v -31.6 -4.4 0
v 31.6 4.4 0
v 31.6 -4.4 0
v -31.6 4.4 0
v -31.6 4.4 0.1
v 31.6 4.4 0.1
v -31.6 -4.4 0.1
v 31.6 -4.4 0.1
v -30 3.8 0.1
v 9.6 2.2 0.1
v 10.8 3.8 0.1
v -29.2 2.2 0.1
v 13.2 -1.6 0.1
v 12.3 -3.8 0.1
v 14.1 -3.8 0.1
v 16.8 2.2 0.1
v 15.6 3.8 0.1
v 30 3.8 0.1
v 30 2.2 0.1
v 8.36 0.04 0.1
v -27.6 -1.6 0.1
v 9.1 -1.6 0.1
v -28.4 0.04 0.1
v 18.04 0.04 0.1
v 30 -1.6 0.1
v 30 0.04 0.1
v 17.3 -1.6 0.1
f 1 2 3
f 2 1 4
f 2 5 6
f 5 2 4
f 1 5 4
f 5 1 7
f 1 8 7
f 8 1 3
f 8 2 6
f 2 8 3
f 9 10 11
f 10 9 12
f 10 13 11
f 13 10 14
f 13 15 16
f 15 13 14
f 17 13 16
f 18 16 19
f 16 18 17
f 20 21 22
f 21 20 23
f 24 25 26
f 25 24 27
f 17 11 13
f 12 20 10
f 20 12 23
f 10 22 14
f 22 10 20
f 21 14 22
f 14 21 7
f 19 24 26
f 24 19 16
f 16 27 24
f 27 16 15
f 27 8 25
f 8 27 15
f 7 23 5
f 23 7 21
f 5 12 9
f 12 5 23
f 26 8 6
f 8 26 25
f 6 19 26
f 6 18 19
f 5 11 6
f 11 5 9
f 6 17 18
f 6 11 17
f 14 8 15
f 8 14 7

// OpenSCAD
// file: ../p/4-4edge.scad
use <../lib.scad>
$fa=1; $fs=0.2;
function ldraw_lib__4_4edge(realsolid=false) = [
// 0 Circle 1.0
// 0 Name: 4-4edge.dat
// 0 Author: James Jessiman
// 0 !LDRAW_ORG Primitive UPDATE 2017-01
// 0 !LICENSE Licensed under CC BY 2.0 and CC BY 4.0 : see CAreadme.txt
// 
// 0 BFC CERTIFY CCW
  [0,"BFC","CERTIFY"],
  [0,"BFC","CCW"],
// 
// 0 !HISTORY 1998-12-15 [PTadmin] Official Update 1998-10
// 0 !HISTORY 2005-12-28 [PTadmin] Official Update 2005-01
// 0 !HISTORY 2007-06-24 [PTadmin] Header formatted for Contributor Agreement
// 0 !HISTORY 2008-07-01 [PTadmin] Official Update 2008-01
// 0 !HISTORY 2017-01-15 [Steffen] BFCed
// 0 !HISTORY 2017-12-30 [PTadmin] Official Update 2017-01
// 
// 
// 2 24 1 0 0 0.9239 0 0.3827
  [2,24,1,0,0,0.9239,0,0.3827],
// 2 24 0.9239 0 0.3827 0.7071 0 0.7071
  [2,24,0.9239,0,0.3827,0.7071,0,0.7071],
// 2 24 0.7071 0 0.7071 0.3827 0 0.9239
  [2,24,0.7071,0,0.7071,0.3827,0,0.9239],
// 2 24 0.3827 0 0.9239 0 0 1
  [2,24,0.3827,0,0.9239,0,0,1],
// 2 24 0 0 1 -0.3827 0 0.9239
  [2,24,0,0,1,-0.3827,0,0.9239],
// 2 24 -0.3827 0 0.9239 -0.7071 0 0.7071
  [2,24,-0.3827,0,0.9239,-0.7071,0,0.7071],
// 2 24 -0.7071 0 0.7071 -0.9239 0 0.3827
  [2,24,-0.7071,0,0.7071,-0.9239,0,0.3827],
// 2 24 -0.9239 0 0.3827 -1 0 -0
  [2,24,-0.9239,0,0.3827,-1,0,-0],
// 2 24 -1 0 -0 -0.9239 0 -0.3827
  [2,24,-1,0,-0,-0.9239,0,-0.3827],
// 2 24 -0.9239 0 -0.3827 -0.7071 0 -0.7071
  [2,24,-0.9239,0,-0.3827,-0.7071,0,-0.7071],
// 2 24 -0.7071 0 -0.7071 -0.3827 0 -0.9239
  [2,24,-0.7071,0,-0.7071,-0.3827,0,-0.9239],
// 2 24 -0.3827 0 -0.9239 0 0 -1
  [2,24,-0.3827,0,-0.9239,0,0,-1],
// 2 24 0 0 -1 0.3827 0 -0.9239
  [2,24,0,0,-1,0.3827,0,-0.9239],
// 2 24 0.3827 0 -0.9239 0.7071 0 -0.7071
  [2,24,0.3827,0,-0.9239,0.7071,0,-0.7071],
// 2 24 0.7071 0 -0.7071 0.9239 0 -0.3827
  [2,24,0.7071,0,-0.7071,0.9239,0,-0.3827],
// 2 24 0.9239 0 -0.3827 1 0 0
  [2,24,0.9239,0,-0.3827,1,0,0],
];
module ldraw_lib__4_4edge(step=0, col=false, unit=2/5, alt=false, line=0.2, solid=!$preview)
    makepoly(ldraw_lib__4_4edge(solid), step=step, col=col, unit=unit, alt=alt, line=line, solid=solid);
ldraw_lib__4_4edge(line=0.2);
// file: ../p/4-4disc.scad
use <../lib.scad>
$fa=1; $fs=0.2;
function ldraw_lib__4_4disc(realsolid=false) = [
// 0 Disc 1.0
// 0 Name: 4-4disc.dat
// 0 Author: James Jessiman
// 0 !LDRAW_ORG Primitive UPDATE 2002-02
// 0 !LICENSE Licensed under CC BY 2.0 and CC BY 4.0 : see CAreadme.txt
// 
// 0 BFC CERTIFY CCW
  [0,"BFC","CERTIFY"],
  [0,"BFC","CCW"],
// 
// 0 !HISTORY 1998-12-15 [PTadmin] Official Update 1998-10
// 0 !HISTORY 2002-03-23 [sbliss] Added BFC statement
// 0 !HISTORY 2002-04-25 [PTadmin] Official Update 2002-02
// 0 !HISTORY 2007-06-24 [PTadmin] Header formatted for Contributor Agreement
// 0 !HISTORY 2008-07-01 [PTadmin] Official Update 2008-01
// 
// 
// 3 16 0 0 0 1 0 0 0.9239 0 0.3827
  [3,16,0,0,0,1,0,0,0.9239,0,0.3827],
// 3 16 0 0 0 0.9239 0 0.3827 0.7071 0 0.7071
  [3,16,0,0,0,0.9239,0,0.3827,0.7071,0,0.7071],
// 3 16 0 0 0 0.7071 0 0.7071 0.3827 0 0.9239
  [3,16,0,0,0,0.7071,0,0.7071,0.3827,0,0.9239],
// 3 16 0 0 0 0.3827 0 0.9239 0 0 1
  [3,16,0,0,0,0.3827,0,0.9239,0,0,1],
// 3 16 0 0 0 0 0 1 -0.3827 0 0.9239
  [3,16,0,0,0,0,0,1,-0.3827,0,0.9239],
// 3 16 0 0 0 -0.3827 0 0.9239 -0.7071 0 0.7071
  [3,16,0,0,0,-0.3827,0,0.9239,-0.7071,0,0.7071],
// 3 16 0 0 0 -0.7071 0 0.7071 -0.9239 0 0.3827
  [3,16,0,0,0,-0.7071,0,0.7071,-0.9239,0,0.3827],
// 3 16 0 0 0 -0.9239 0 0.3827 -1 0 -0
  [3,16,0,0,0,-0.9239,0,0.3827,-1,0,-0],
// 3 16 0 0 0 -1 0 -0 -0.9239 0 -0.3827
  [3,16,0,0,0,-1,0,-0,-0.9239,0,-0.3827],
// 3 16 0 0 0 -0.9239 0 -0.3827 -0.7071 0 -0.7071
  [3,16,0,0,0,-0.9239,0,-0.3827,-0.7071,0,-0.7071],
// 3 16 0 0 0 -0.7071 0 -0.7071 -0.3827 0 -0.9239
  [3,16,0,0,0,-0.7071,0,-0.7071,-0.3827,0,-0.9239],
// 3 16 0 0 0 -0.3827 0 -0.9239 0 0 -1
  [3,16,0,0,0,-0.3827,0,-0.9239,0,0,-1],
// 3 16 0 0 0 0 0 -1 0.3827 0 -0.9239
  [3,16,0,0,0,0,0,-1,0.3827,0,-0.9239],
// 3 16 0 0 0 0.3827 0 -0.9239 0.7071 0 -0.7071
  [3,16,0,0,0,0.3827,0,-0.9239,0.7071,0,-0.7071],
// 3 16 0 0 0 0.7071 0 -0.7071 0.9239 0 -0.3827
  [3,16,0,0,0,0.7071,0,-0.7071,0.9239,0,-0.3827],
// 3 16 0 0 0 0.9239 0 -0.3827 1 0 0
  [3,16,0,0,0,0.9239,0,-0.3827,1,0,0],
// 0
];
module ldraw_lib__4_4disc(step=0, col=false, unit=2/5, alt=false, line=0.2, solid=!$preview)
    makepoly(ldraw_lib__4_4disc(solid), step=step, col=col, unit=unit, alt=alt, line=line, solid=solid);
ldraw_lib__4_4disc(line=0.2);
// file: ../p/4-4cyli.scad
use <../lib.scad>
$fa=1; $fs=0.2;
function ldraw_lib__4_4cyli(realsolid=false) = [
// 0 Cylinder 1.0
// 0 Name: 4-4cyli.dat
// 0 Author: James Jessiman
// 0 !LDRAW_ORG Primitive UPDATE 2005-01
// 0 !LICENSE Licensed under CC BY 2.0 and CC BY 4.0 : see CAreadme.txt
// 
// 0 BFC CERTIFY CCW
  [0,"BFC","CERTIFY"],
  [0,"BFC","CCW"],
// 
// 0 !HISTORY 1998-12-15 [PTadmin] Official Update 1998-10
// 0 !HISTORY 2002-03-23 [sbliss] Added BFC statement; merged headers from files in distributions LDraw 0.27 and Complete.
// 0 !HISTORY 2002-04-25 [PTadmin] Official Update 2002-02
// 0 !HISTORY 2004-12-14 [guyvivan] BFC CCW
// 0 !HISTORY 2005-12-28 [PTadmin] Official Update 2005-01
// 0 !HISTORY 2007-06-24 [PTadmin] Header formatted for Contributor Agreement
// 0 !HISTORY 2008-07-01 [PTadmin] Official Update 2008-01
// 
// 
// 4 16 1 1 0 0.9239 1 0.3827 0.9239 0 0.3827 1 0 0
  [4,16,1,1,0,0.9239,1,0.3827,0.9239,0,0.3827,1,0,0],
// 5 24 1 0 0 1 1 0 0.9239 0 0.3827 0.9239 0 -0.3827
  [5,24,1,0,0,1,1,0,0.9239,0,0.3827,0.9239,0,-0.3827],
// 4 16 0.9239 1 0.3827 0.7071 1 0.7071 0.7071 0 0.7071 0.9239 0 0.3827
  [4,16,0.9239,1,0.3827,0.7071,1,0.7071,0.7071,0,0.7071,0.9239,0,0.3827],
// 5 24 0.9239 0 0.3827 0.9239 1 0.3827 0.7071 0 0.7071 1 0 0
  [5,24,0.9239,0,0.3827,0.9239,1,0.3827,0.7071,0,0.7071,1,0,0],
// 4 16 0.7071 1 0.7071 0.3827 1 0.9239 0.3827 0 0.9239 0.7071 0 0.7071
  [4,16,0.7071,1,0.7071,0.3827,1,0.9239,0.3827,0,0.9239,0.7071,0,0.7071],
// 5 24 0.7071 0 0.7071 0.7071 1 0.7071 0.3827 0 0.9239 0.9239 0 0.3827
  [5,24,0.7071,0,0.7071,0.7071,1,0.7071,0.3827,0,0.9239,0.9239,0,0.3827],
// 4 16 0.3827 1 0.9239 0 1 1 0 0 1 0.3827 0 0.9239
  [4,16,0.3827,1,0.9239,0,1,1,0,0,1,0.3827,0,0.9239],
// 5 24 0.3827 0 0.9239 0.3827 1 0.9239 0 0 1 0.7071 0 0.7071
  [5,24,0.3827,0,0.9239,0.3827,1,0.9239,0,0,1,0.7071,0,0.7071],
// 4 16 0 1 1 -0.3827 1 0.9239 -0.3827 0 0.9239 0 0 1
  [4,16,0,1,1,-0.3827,1,0.9239,-0.3827,0,0.9239,0,0,1],
// 5 24 0 0 1 0 1 1 -0.3827 0 0.9239 0.3827 0 0.9239
  [5,24,0,0,1,0,1,1,-0.3827,0,0.9239,0.3827,0,0.9239],
// 4 16 -0.3827 1 0.9239 -0.7071 1 0.7071 -0.7071 0 0.7071 -0.3827 0 0.9239
  [4,16,-0.3827,1,0.9239,-0.7071,1,0.7071,-0.7071,0,0.7071,-0.3827,0,0.9239],
// 5 24 -0.3827 0 0.9239 -0.3827 1 0.9239 -0.7071 0 0.7071 0 0 1
  [5,24,-0.3827,0,0.9239,-0.3827,1,0.9239,-0.7071,0,0.7071,0,0,1],
// 4 16 -0.7071 1 0.7071 -0.9239 1 0.3827 -0.9239 0 0.3827 -0.7071 0 0.7071
  [4,16,-0.7071,1,0.7071,-0.9239,1,0.3827,-0.9239,0,0.3827,-0.7071,0,0.7071],
// 5 24 -0.7071 0 0.7071 -0.7071 1 0.7071 -0.9239 0 0.3827 -0.3827 0 0.9239
  [5,24,-0.7071,0,0.7071,-0.7071,1,0.7071,-0.9239,0,0.3827,-0.3827,0,0.9239],
// 4 16 -0.9239 1 0.3827 -1 1 0 -1 0 0 -0.9239 0 0.3827
  [4,16,-0.9239,1,0.3827,-1,1,0,-1,0,0,-0.9239,0,0.3827],
// 5 24 -0.9239 0 0.3827 -0.9239 1 0.3827 -1 0 0 -0.7071 0 0.7071
  [5,24,-0.9239,0,0.3827,-0.9239,1,0.3827,-1,0,0,-0.7071,0,0.7071],
// 4 16 -1 1 0 -0.9239 1 -0.3827 -0.9239 0 -0.3827 -1 0 0
  [4,16,-1,1,0,-0.9239,1,-0.3827,-0.9239,0,-0.3827,-1,0,0],
// 5 24 -1 0 0 -1 1 0 -0.9239 0 -0.3827 -0.9239 0 0.3827
  [5,24,-1,0,0,-1,1,0,-0.9239,0,-0.3827,-0.9239,0,0.3827],
// 4 16 -0.9239 1 -0.3827 -0.7071 1 -0.7071 -0.7071 0 -0.7071 -0.9239 0 -0.3827
  [4,16,-0.9239,1,-0.3827,-0.7071,1,-0.7071,-0.7071,0,-0.7071,-0.9239,0,-0.3827],
// 5 24 -0.9239 0 -0.3827 -0.9239 1 -0.3827 -0.7071 0 -0.7071 -1 0 0
  [5,24,-0.9239,0,-0.3827,-0.9239,1,-0.3827,-0.7071,0,-0.7071,-1,0,0],
// 4 16 -0.7071 1 -0.7071 -0.3827 1 -0.9239 -0.3827 0 -0.9239 -0.7071 0 -0.7071
  [4,16,-0.7071,1,-0.7071,-0.3827,1,-0.9239,-0.3827,0,-0.9239,-0.7071,0,-0.7071],
// 5 24 -0.7071 0 -0.7071 -0.7071 1 -0.7071 -0.3827 0 -0.9239 -0.9239 0 -0.3827
  [5,24,-0.7071,0,-0.7071,-0.7071,1,-0.7071,-0.3827,0,-0.9239,-0.9239,0,-0.3827],
// 4 16 -0.3827 1 -0.9239 0 1 -1 0 0 -1 -0.3827 0 -0.9239
  [4,16,-0.3827,1,-0.9239,0,1,-1,0,0,-1,-0.3827,0,-0.9239],
// 5 24 -0.3827 0 -0.9239 -0.3827 1 -0.9239 0 0 -1 -0.7071 0 -0.7071
  [5,24,-0.3827,0,-0.9239,-0.3827,1,-0.9239,0,0,-1,-0.7071,0,-0.7071],
// 4 16 0 1 -1 0.3827 1 -0.9239 0.3827 0 -0.9239 0 0 -1
  [4,16,0,1,-1,0.3827,1,-0.9239,0.3827,0,-0.9239,0,0,-1],
// 5 24 0 0 -1 0 1 -1 0.3827 0 -0.9239 -0.3827 0 -0.9239
  [5,24,0,0,-1,0,1,-1,0.3827,0,-0.9239,-0.3827,0,-0.9239],
// 4 16 0.3827 1 -0.9239 0.7071 1 -0.7071 0.7071 0 -0.7071 0.3827 0 -0.9239
  [4,16,0.3827,1,-0.9239,0.7071,1,-0.7071,0.7071,0,-0.7071,0.3827,0,-0.9239],
// 5 24 0.3827 0 -0.9239 0.3827 1 -0.9239 0.7071 0 -0.7071 0 0 -1
  [5,24,0.3827,0,-0.9239,0.3827,1,-0.9239,0.7071,0,-0.7071,0,0,-1],
// 4 16 0.7071 1 -0.7071 0.9239 1 -0.3827 0.9239 0 -0.3827 0.7071 0 -0.7071
  [4,16,0.7071,1,-0.7071,0.9239,1,-0.3827,0.9239,0,-0.3827,0.7071,0,-0.7071],
// 5 24 0.7071 0 -0.7071 0.7071 1 -0.7071 0.9239 0 -0.3827 0.3827 0 -0.9239
  [5,24,0.7071,0,-0.7071,0.7071,1,-0.7071,0.9239,0,-0.3827,0.3827,0,-0.9239],
// 4 16 0.9239 1 -0.3827 1 1 0 1 0 0 0.9239 0 -0.3827
  [4,16,0.9239,1,-0.3827,1,1,0,1,0,0,0.9239,0,-0.3827],
// 5 24 0.9239 0 -0.3827 0.9239 1 -0.3827 1 0 0 0.7071 0 -0.7071
  [5,24,0.9239,0,-0.3827,0.9239,1,-0.3827,1,0,0,0.7071,0,-0.7071],
// 0
];
module ldraw_lib__4_4cyli(step=0, col=false, unit=2/5, alt=false, line=0.2, solid=!$preview)
    makepoly(ldraw_lib__4_4cyli(solid), step=step, col=col, unit=unit, alt=alt, line=line, solid=solid);
ldraw_lib__4_4cyli(line=0.2);
// file: ../p/stud3.scad
use <../lib.scad>
use <4-4cyli.scad>
use <4-4disc.scad>
use <4-4edge.scad>
$fa=1; $fs=0.2;
function ldraw_lib__stud3(realsolid=false) = realsolid ? 
    [openscad(translate([0,0,-eps()], o=cylinder(4+eps(), r=4)),2)] : [
// 0 Stud Tube Solid
// 0 Name: stud3.dat
// 0 Author: James Jessiman
// 0 !LDRAW_ORG Primitive UPDATE 2012-01
// 0 !LICENSE Licensed under CC BY 2.0 and CC BY 4.0 : see CAreadme.txt
// 
// 0 BFC CERTIFY CCW
  [0,"BFC","CERTIFY"],
  [0,"BFC","CCW"],
// 
// 0 !HISTORY 2002-04-04 [sbliss] Modified for BFC compliance
// 0 !HISTORY 2002-04-25 [PTadmin] Official Update 2002-02
// 0 !HISTORY 2007-06-24 [PTadmin] Header formatted for Contributor Agreement
// 0 !HISTORY 2008-07-01 [PTadmin] Official Update 2008-01
// 0 !HISTORY 2012-02-16 [Philo] Changed to CCW
// 0 !HISTORY 2012-03-30 [PTadmin] Official Update 2012-01
// 
// 
// 1 16 0 -4 0 4 0 0 0 1 0 0 0 4 4-4edge.dat
  [1,16,0,-4,0,4,0,0,0,1,0,0,0,4, ldraw_lib__4_4edge(realsolid)],
// 1 16 0 0 0 4 0 0 0 1 0 0 0 4 4-4edge.dat
  [1,16,0,0,0,4,0,0,0,1,0,0,0,4, ldraw_lib__4_4edge(realsolid)],
// 1 16 0 -4 0 4 0 0 0 1 0 0 0 4 4-4disc.dat
  [1,16,0,-4,0,4,0,0,0,1,0,0,0,4, ldraw_lib__4_4disc(realsolid)],
// 1 16 0 -4 0 4 0 0 0 4 0 0 0 4 4-4cyli.dat
  [1,16,0,-4,0,4,0,0,0,4,0,0,0,4, ldraw_lib__4_4cyli(realsolid)],
];
module ldraw_lib__stud3(step=0, col=false, unit=2/5, alt=false, line=0.2, solid=!$preview)
    makepoly(ldraw_lib__stud3(solid), step=step, col=col, unit=unit, alt=alt, line=line, solid=solid);
ldraw_lib__stud3(line=0.2);
// file: ../p/stud.scad
use <../lib.scad>
use <4-4cyli.scad>
use <4-4disc.scad>
use <4-4edge.scad>
$fa=1; $fs=0.2;
function ldraw_lib__stud(realsolid=false) = realsolid ? 
    [openscad(translate([0,0,-eps()], o=cylinder(4+eps(), r=6)),2)] : [
// 0 Stud
// 0 Name: stud.dat
// 0 Author: James Jessiman
// 0 !LDRAW_ORG Primitive UPDATE 2012-01
// 0 !LICENSE Licensed under CC BY 2.0 and CC BY 4.0 : see CAreadme.txt
// 
// 0 BFC CERTIFY CCW
  [0,"BFC","CERTIFY"],
  [0,"BFC","CCW"],
// 
// 0 !HISTORY 2002-04-04 [sbliss] Modified for BFC compliance
// 0 !HISTORY 2002-04-25 [PTadmin] Official Update 2002-02
// 0 !HISTORY 2007-06-24 [PTadmin] Header formatted for Contributor Agreement
// 0 !HISTORY 2008-07-01 [PTadmin] Official Update 2008-01
// 0 !HISTORY 2012-02-16 [Philo] Changed to CCW
// 0 !HISTORY 2012-03-30 [PTadmin] Official Update 2012-01
// 
// 
// 1 16 0 0 0 6 0 0 0 1 0 0 0 6 4-4edge.dat
  [1,16,0,0,0,6,0,0,0,1,0,0,0,6, ldraw_lib__4_4edge(realsolid)],
// 1 16 0 -4 0 6 0 0 0 1 0 0 0 6 4-4edge.dat
  [1,16,0,-4,0,6,0,0,0,1,0,0,0,6, ldraw_lib__4_4edge(realsolid)],
// 1 16 0 0 0 6 0 0 0 -4 0 0 0 6 4-4cyli.dat
  [1,16,0,0,0,6,0,0,0,-4,0,0,0,6, ldraw_lib__4_4cyli(realsolid)],
// 1 16 0 -4 0 6 0 0 0 1 0 0 0 6 4-4disc.dat
  [1,16,0,-4,0,6,0,0,0,1,0,0,0,6, ldraw_lib__4_4disc(realsolid)],
];
module ldraw_lib__stud(step=0, col=false, unit=2/5, alt=false, line=0.2, solid=!$preview)
    makepoly(ldraw_lib__stud(solid), step=step, col=col, unit=unit, alt=alt, line=line, solid=solid);
ldraw_lib__stud(line=0.2);
// file: ../p/box5.scad
use <../lib.scad>
$fa=1; $fs=0.2;
function ldraw_lib__box5(realsolid=false) = [
// 0 Box with 5 Faces and All Edges
// 0 Name: box5.dat
// 0 Author: James Jessiman
// 0 !LDRAW_ORG Primitive UPDATE 2012-01
// 0 !LICENSE Licensed under CC BY 2.0 and CC BY 4.0 : see CAreadme.txt
// 
// 0 BFC CERTIFY CCW
  [0,"BFC","CERTIFY"],
  [0,"BFC","CCW"],
// 
// 0 !HISTORY 2002-04-03 [sbliss] Modified for BFC compliance
// 0 !HISTORY 2002-04-25 [PTadmin] Official Update 2002-02
// 0 !HISTORY 2007-06-24 [PTadmin] Header formatted for Contributor Agreement
// 0 !HISTORY 2008-07-01 [PTadmin] Official Update 2008-01
// 0 !HISTORY 2012-02-16 [Philo] Changed to CCW
// 0 !HISTORY 2012-03-30 [PTadmin] Official Update 2012-01
// 
// 
// 2 24 1 1 1 -1 1 1
  [2,24,1,1,1,-1,1,1],
// 2 24 -1 1 1 -1 1 -1
  [2,24,-1,1,1,-1,1,-1],
// 2 24 -1 1 -1 1 1 -1
  [2,24,-1,1,-1,1,1,-1],
// 2 24 1 1 -1 1 1 1
  [2,24,1,1,-1,1,1,1],
// 2 24 1 0 1 -1 0 1
  [2,24,1,0,1,-1,0,1],
// 2 24 -1 0 1 -1 0 -1
  [2,24,-1,0,1,-1,0,-1],
// 2 24 -1 0 -1 1 0 -1
  [2,24,-1,0,-1,1,0,-1],
// 2 24 1 0 -1 1 0 1
  [2,24,1,0,-1,1,0,1],
// 2 24 1 0 1 1 1 1
  [2,24,1,0,1,1,1,1],
// 2 24 -1 0 1 -1 1 1
  [2,24,-1,0,1,-1,1,1],
// 2 24 1 0 -1 1 1 -1
  [2,24,1,0,-1,1,1,-1],
// 2 24 -1 0 -1 -1 1 -1
  [2,24,-1,0,-1,-1,1,-1],
// 4 16 -1 1 1 1 1 1 1 1 -1 -1 1 -1
  [4,16,-1,1,1,1,1,1,1,1,-1,-1,1,-1],
// 4 16 -1 1 1 -1 0 1 1 0 1 1 1 1
  [4,16,-1,1,1,-1,0,1,1,0,1,1,1,1],
// 4 16 -1 1 -1 -1 0 -1 -1 0 1 -1 1 1
  [4,16,-1,1,-1,-1,0,-1,-1,0,1,-1,1,1],
// 4 16 1 1 -1 1 0 -1 -1 0 -1 -1 1 -1
  [4,16,1,1,-1,1,0,-1,-1,0,-1,-1,1,-1],
// 4 16 1 1 1 1 0 1 1 0 -1 1 1 -1
  [4,16,1,1,1,1,0,1,1,0,-1,1,1,-1],
];
module ldraw_lib__box5(step=0, col=false, unit=2/5, alt=false, line=0.2, solid=!$preview)
    makepoly(ldraw_lib__box5(solid), step=step, col=col, unit=unit, alt=alt, line=line, solid=solid);
ldraw_lib__box5(line=0.2);
// file: ../p/box4t.scad
use <../lib.scad>
$fa=1; $fs=0.2;
function ldraw_lib__box4t(realsolid=false) = [
// 0 Box with 4 Adjacent Faces and All Edges
// 0 Name: box4t.dat
// 0 Author: Tore Eriksson [Tore_Eriksson]
// 0 !LDRAW_ORG Primitive UPDATE 2003-02
// 0 !LICENSE Licensed under CC BY 2.0 and CC BY 4.0 : see CAreadme.txt
// 
// 0 BFC CERTIFY CCW
  [0,"BFC","CERTIFY"],
  [0,"BFC","CCW"],
// 
// 0 !HISTORY 1997-09-29 [PTadmin] Official Update 1997-15
// 0 !HISTORY 2002-08-31 [izanette] Modified with WINDZ for BFC compliance
// 0 !HISTORY 2003-08-01 [PTadmin] Official Update 2003-02
// 0 !HISTORY 2007-06-24 [PTadmin] Header formatted for Contributor Agreement
// 0 !HISTORY 2008-07-01 [PTadmin] Official Update 2008-01
// 
// 
// 2 24 1 1 1 -1 1 1
  [2,24,1,1,1,-1,1,1],
// 2 24 -1 1 1 -1 1 -1
  [2,24,-1,1,1,-1,1,-1],
// 2 24 -1 1 -1 1 1 -1
  [2,24,-1,1,-1,1,1,-1],
// 2 24 1 1 -1 1 1 1
  [2,24,1,1,-1,1,1,1],
// 2 24 1 0 1 -1 0 1
  [2,24,1,0,1,-1,0,1],
// 2 24 -1 0 1 -1 0 -1
  [2,24,-1,0,1,-1,0,-1],
// 2 24 -1 0 -1 1 0 -1
  [2,24,-1,0,-1,1,0,-1],
// 2 24 1 0 -1 1 0 1
  [2,24,1,0,-1,1,0,1],
// 2 24 1 0 1 1 1 1
  [2,24,1,0,1,1,1,1],
// 2 24 -1 0 1 -1 1 1
  [2,24,-1,0,1,-1,1,1],
// 2 24 1 0 -1 1 1 -1
  [2,24,1,0,-1,1,1,-1],
// 2 24 -1 0 -1 -1 1 -1
  [2,24,-1,0,-1,-1,1,-1],
// 4 16 1 1 1 1 1 -1 -1 1 -1 -1 1 1
  [4,16,1,1,1,1,1,-1,-1,1,-1,-1,1,1],
// 4 16 1 1 1 -1 1 1 -1 0 1 1 0 1
  [4,16,1,1,1,-1,1,1,-1,0,1,1,0,1],
// 4 16 -1 1 1 -1 1 -1 -1 0 -1 -1 0 1
  [4,16,-1,1,1,-1,1,-1,-1,0,-1,-1,0,1],
// 0 4 16 -1 1 -1 -1 0 -1 1 0 -1 1 1 -1
// 4 16 1 1 -1 1 1 1 1 0 1 1 0 -1
  [4,16,1,1,-1,1,1,1,1,0,1,1,0,-1],
// 0
];
module ldraw_lib__box4t(step=0, col=false, unit=2/5, alt=false, line=0.2, solid=!$preview)
    makepoly(ldraw_lib__box4t(solid), step=step, col=col, unit=unit, alt=alt, line=line, solid=solid);
ldraw_lib__box4t(line=0.2);
// file: s/3004s01.scad
use <../../lib.scad>
use <../../p/box4t.scad>
use <../../p/box5.scad>
use <../../p/stud.scad>
use <../../p/stud3.scad>
$fa=1; $fs=0.2;
function ldraw_lib__s__3004s01(realsolid=false) = [
// 0 ~Brick  1 x  2 without Front Face
// 0 Name: s\3004s01.dat
// 0 Author: James Jessiman
// 0 !LDRAW_ORG Subpart UPDATE 2003-03
// 0 !LICENSE Licensed under CC BY 2.0 and CC BY 4.0 : see CAreadme.txt
// 
// 0 BFC CERTIFY CCW
  [0,"BFC","CERTIFY"],
  [0,"BFC","CCW"],
// 
// 0 !HISTORY 2003-09-07 [jriley] Subfiling, BFC
// 0 !HISTORY 2003-12-19 [PTadmin] Official Update 2003-03
// 0 !HISTORY 2007-08-29 [PTadmin] Header formatted for Contributor Agreement
// 0 !HISTORY 2008-07-01 [PTadmin] Official Update 2008-01
// 
// 
// 1 16 0 4 0 1 0 0 0 -5 0 0 0 1 stud3.dat
  [1,16,0,4,0,1,0,0,0,-5,0,0,0,1, ldraw_lib__stud3(realsolid)],
// 0 BFC INVERTNEXT
  [0,"BFC","INVERTNEXT"],
// 1 16 0 24 0 16 0 0 0 -20 0 0 0 6 box5.dat
  [1,16,0,24,0,16,0,0,0,-20,0,0,0,6, ldraw_lib__box5(realsolid)],
// 4 16 20 24 10 16 24 6 -16 24 6 -20 24 10
  [4,16,20,24,10,16,24,6,-16,24,6,-20,24,10],
// 4 16 -20 24 10 -16 24 6 -16 24 -6 -20 24 -10
  [4,16,-20,24,10,-16,24,6,-16,24,-6,-20,24,-10],
// 4 16 -20 24 -10 -16 24 -6 16 24 -6 20 24 -10
  [4,16,-20,24,-10,-16,24,-6,16,24,-6,20,24,-10],
// 4 16 20 24 -10 16 24 -6 16 24 6 20 24 10
  [4,16,20,24,-10,16,24,-6,16,24,6,20,24,10],
// 1 16 0 24 0 20 0 0 0 -24 0 0 0 10 box4t.dat
  [1,16,0,24,0,20,0,0,0,-24,0,0,0,10, ldraw_lib__box4t(realsolid)],
// 1 16 10 0 0 1 0 0 0 1 0 0 0 1 stud.dat
  [1,16,10,0,0,1,0,0,0,1,0,0,0,1, ldraw_lib__stud(realsolid)],
// 1 16 -10 0 0 1 0 0 0 1 0 0 0 1 stud.dat
  [1,16,-10,0,0,1,0,0,0,1,0,0,0,1, ldraw_lib__stud(realsolid)],
// 0
];
module ldraw_lib__s__3004s01(step=0, col=false, unit=2/5, alt=false, line=0.2, solid=!$preview)
    makepoly(ldraw_lib__s__3004s01(solid), step=step, col=col, unit=unit, alt=alt, line=line, solid=solid);
ldraw_lib__s__3004s01(line=0.2);
// file: 3004.scad
use <../lib.scad>
use <s/3004s01.scad>
$fa=1; $fs=0.2;
function ldraw_lib__3004(realsolid=false) = [
// 0 Brick  1 x  2
// 0 Name: 3004.dat
// 0 Author: James Jessiman
// 0 !LDRAW_ORG Part UPDATE 2022-05
// 0 !LICENSE Licensed under CC BY 2.0 and CC BY 4.0 : see CAreadme.txt
// 
// 0 BFC CERTIFY CCW
  [0,"BFC","CERTIFY"],
  [0,"BFC","CCW"],
// 
// 0 !HISTORY 2001-10-26 [PTadmin] Official Update 2001-01
// 0 !HISTORY 2002-05-07 {unknown} BFC Certification
// 0 !HISTORY 2002-06-11 [PTadmin] Official Update 2002-03
// 0 !HISTORY 2007-05-07 [PTadmin] Header formatted for Contributor Agreement
// 0 !HISTORY 2008-07-01 [PTadmin] Official Update 2008-01
// 0 !HISTORY 2022-08-04 [MagFors] Using subfile
// 0 !HISTORY 2022-09-15 [PTadmin] Official Update 2022-05
// 
// 
// 1 16 0 0 0 1 0 0 0 1 0 0 0 1 s\3004s01.dat
  [1,16,0,0,0,1,0,0,0,1,0,0,0,1, ldraw_lib__s__3004s01(realsolid)],
// 4 16 -20 24 -10 20 24 -10 20 0 -10 -20 0 -10
  [4,16,-20,24,-10,20,24,-10,20,0,-10,-20,0,-10],
];
module ldraw_lib__3004(step=0, col=false, unit=2/5, alt=false, line=0.2, solid=!$preview)
    makepoly(ldraw_lib__3004(solid), step=step, col=col, unit=unit, alt=alt, line=line, solid=solid);
ldraw_lib__3004(line=0.2);
// file: ../p/box5-12.scad
use <../lib.scad>
$fa=1; $fs=0.2;
function ldraw_lib__box5_12(realsolid=false) = [
// 0 Box with 5 Faces without Any Edges
// 0 Name: box5-12.dat
// 0 Author: Chris Dee [cwdee]
// 0 !LDRAW_ORG Primitive UPDATE 2009-02
// 0 !LICENSE Licensed under CC BY 2.0 and CC BY 4.0 : see CAreadme.txt
// 
// 0 BFC CERTIFY CCW
  [0,"BFC","CERTIFY"],
  [0,"BFC","CCW"],
// 
// 0 !HISTORY 2009-09-03 [PTadmin] Official Update 2009-02
// 
// 
// 4 16 1 1 1 1 1 -1 -1 1 -1 -1 1 1
  [4,16,1,1,1,1,1,-1,-1,1,-1,-1,1,1],
// 4 16 -1 0 1 1 0 1 1 1 1 -1 1 1
  [4,16,-1,0,1,1,0,1,1,1,1,-1,1,1],
// 4 16 -1 0 -1 -1 0 1 -1 1 1 -1 1 -1
  [4,16,-1,0,-1,-1,0,1,-1,1,1,-1,1,-1],
// 4 16 1 0 -1 -1 0 -1 -1 1 -1 1 1 -1
  [4,16,1,0,-1,-1,0,-1,-1,1,-1,1,1,-1],
// 4 16 1 0 1 1 0 -1 1 1 -1 1 1 1
  [4,16,1,0,1,1,0,-1,1,1,-1,1,1,1],
// 0
];
module ldraw_lib__box5_12(step=0, col=false, unit=2/5, alt=false, line=0.2, solid=!$preview)
    makepoly(ldraw_lib__box5_12(solid), step=step, col=col, unit=unit, alt=alt, line=line, solid=solid);
ldraw_lib__box5_12(line=0.2);
// main file
use <../lib.scad>
use <../p/box5-12.scad>
$fa=1; $fs=0.2;
function ldraw_lib__165485c(realsolid=false) = [
// 0 Sticker  1.1 x  7.9 with Blue V and Red Lines Left on Transparent Background
// 0 Name: 165485c.dat
// 0 Author: Takeshi Takahashi [RainbowDolphin]
// 0 !LDRAW_ORG Part UPDATE 2022-06
// 0 !LICENSE Licensed under CC BY 2.0 and CC BY 4.0 : see CAreadme.txt
// 
// 0 BFC CERTIFY CCW
  [0,"BFC","CERTIFY"],
  [0,"BFC","CCW"],
// 
// 0 !KEYWORDS Bricklink 6346stk01, Brickowl 418865, Orbiter, Rebrickable 165485
// 0 !KEYWORDS set 6346, Space Shuttle
// 
// 0 !HISTORY 2022-06-18 [RainbowDolphin] Created based on 165485a by David Manley [djm]
// 0 !HISTORY 2022-12-20 [PTadmin] Official Update 2022-06
// 
// 
// 1 16 0 -0.25 0 79 0 0 0 0.25 0 0 0 11 box5-12.dat
  [1,16,0,-0.25,0,79,0,0,0,0.25,0,0,0,11, ldraw_lib__box5_12(realsolid)],
// 0 BFC NOCLIP
  [0,"BFC","NOCLIP"],
// 4 1 -73 -0.25 5.5 24 -0.25 5.5 27 -0.25 9.5 -75 -0.25 9.5
  [4,1,-73,-0.25,5.5,24,-0.25,5.5,27,-0.25,9.5,-75,-0.25,9.5],
// 4 1 30.75 -0.25 -9.5 33 -0.25 -4 27 -0.25 9.5 24 -0.25 5.5
  [4,1,30.75,-0.25,-9.5,33,-0.25,-4,27,-0.25,9.5,24,-0.25,5.5],
// 4 1 33 -0.25 -4 30.75 -0.25 -9.5 35.25 -0.25 -9.5 42 -0.25 5.5
  [4,1,33,-0.25,-4,30.75,-0.25,-9.5,35.25,-0.25,-9.5,42,-0.25,5.5],
// 3 1 39 -0.25 9.5 33 -0.25 -4 42 -0.25 5.5
  [3,1,39,-0.25,9.5,33,-0.25,-4,42,-0.25,5.5],
// 4 1 75 -0.25 9.5 39 -0.25 9.5 42 -0.25 5.5 75 -0.25 5.5
  [4,1,75,-0.25,9.5,39,-0.25,9.5,42,-0.25,5.5,75,-0.25,5.5],
// 4 4 -69 -0.25 -4 22.75 -0.25 -4 20.9 -0.25 0.1 -71 -0.25 0.1
  [4,4,-69,-0.25,-4,22.75,-0.25,-4,20.9,-0.25,0.1,-71,-0.25,0.1],
// 4 4 75 -0.25 0.1 45.1 -0.25 0.1 43.25 -0.25 -4 75 -0.25 -4
  [4,4,75,-0.25,0.1,45.1,-0.25,0.1,43.25,-0.25,-4,75,-0.25,-4],
// 0 BFC CLIP
  [0,"BFC","CLIP"],
// 3 16 39 -0.25 9.5 27 -0.25 9.5 33 -0.25 -4
  [3,16,39,-0.25,9.5,27,-0.25,9.5,33,-0.25,-4],
// 4 16 -71 -0.25 0.1 20.9 -0.25 0.1 24 -0.25 5.5 -73 -0.25 5.5
  [4,16,-71,-0.25,0.1,20.9,-0.25,0.1,24,-0.25,5.5,-73,-0.25,5.5],
// 4 16 24 -0.25 5.5 20.9 -0.25 0.1 22.75 -0.25 -4 30.75 -0.25 -9.5
  [4,16,24,-0.25,5.5,20.9,-0.25,0.1,22.75,-0.25,-4,30.75,-0.25,-9.5],
// 4 16 30.75 -0.25 -9.5 22.75 -0.25 -4 -69 -0.25 -4 -79 -0.25 -11
  [4,16,30.75,-0.25,-9.5,22.75,-0.25,-4,-69,-0.25,-4,-79,-0.25,-11],
// 4 16 75 -0.25 5.5 42 -0.25 5.5 45.1 -0.25 0.1 75 -0.25 0.1
  [4,16,75,-0.25,5.5,42,-0.25,5.5,45.1,-0.25,0.1,75,-0.25,0.1],
// 4 16 35.25 -0.25 -9.5 43.25 -0.25 -4 45.1 -0.25 0.1 42 -0.25 5.5
  [4,16,35.25,-0.25,-9.5,43.25,-0.25,-4,45.1,-0.25,0.1,42,-0.25,5.5],
// 4 16 75 -0.25 -4 43.25 -0.25 -4 35.25 -0.25 -9.5 79 -0.25 -11
  [4,16,75,-0.25,-4,43.25,-0.25,-4,35.25,-0.25,-9.5,79,-0.25,-11],
// 4 16 -79 -0.25 -11 -69 -0.25 -4 -71 -0.25 0.1 -79 -0.25 11
  [4,16,-79,-0.25,-11,-69,-0.25,-4,-71,-0.25,0.1,-79,-0.25,11],
// 4 16 -79 -0.25 11 -71 -0.25 0.1 -73 -0.25 5.5 -75 -0.25 9.5
  [4,16,-79,-0.25,11,-71,-0.25,0.1,-73,-0.25,5.5,-75,-0.25,9.5],
// 4 16 79 -0.25 11 75 -0.25 0.1 75 -0.25 -4 79 -0.25 -11
  [4,16,79,-0.25,11,75,-0.25,0.1,75,-0.25,-4,79,-0.25,-11],
// 3 16 79 -0.25 11 75 -0.25 5.5 75 -0.25 0.1
  [3,16,79,-0.25,11,75,-0.25,5.5,75,-0.25,0.1],
// 3 16 79 -0.25 11 75 -0.25 9.5 75 -0.25 5.5
  [3,16,79,-0.25,11,75,-0.25,9.5,75,-0.25,5.5],
// 4 16 -79 -0.25 11 -75 -0.25 9.5 27 -0.25 9.5 79 -0.25 11
  [4,16,-79,-0.25,11,-75,-0.25,9.5,27,-0.25,9.5,79,-0.25,11],
// 3 16 79 -0.25 11 39 -0.25 9.5 75 -0.25 9.5
  [3,16,79,-0.25,11,39,-0.25,9.5,75,-0.25,9.5],
// 3 16 79 -0.25 11 27 -0.25 9.5 39 -0.25 9.5
  [3,16,79,-0.25,11,27,-0.25,9.5,39,-0.25,9.5],
// 4 16 -79 -0.25 -11 79 -0.25 -11 35.25 -0.25 -9.5 30.75 -0.25 -9.5
  [4,16,-79,-0.25,-11,79,-0.25,-11,35.25,-0.25,-9.5,30.75,-0.25,-9.5],
];
module ldraw_lib__165485c(step=0, col=false, unit=2/5, alt=false, line=0.2, solid=!$preview)
    makepoly(ldraw_lib__165485c(solid), step=step, col=col, unit=unit, alt=alt, line=line, solid=solid);
ldraw_lib__165485c(line=0.2);
